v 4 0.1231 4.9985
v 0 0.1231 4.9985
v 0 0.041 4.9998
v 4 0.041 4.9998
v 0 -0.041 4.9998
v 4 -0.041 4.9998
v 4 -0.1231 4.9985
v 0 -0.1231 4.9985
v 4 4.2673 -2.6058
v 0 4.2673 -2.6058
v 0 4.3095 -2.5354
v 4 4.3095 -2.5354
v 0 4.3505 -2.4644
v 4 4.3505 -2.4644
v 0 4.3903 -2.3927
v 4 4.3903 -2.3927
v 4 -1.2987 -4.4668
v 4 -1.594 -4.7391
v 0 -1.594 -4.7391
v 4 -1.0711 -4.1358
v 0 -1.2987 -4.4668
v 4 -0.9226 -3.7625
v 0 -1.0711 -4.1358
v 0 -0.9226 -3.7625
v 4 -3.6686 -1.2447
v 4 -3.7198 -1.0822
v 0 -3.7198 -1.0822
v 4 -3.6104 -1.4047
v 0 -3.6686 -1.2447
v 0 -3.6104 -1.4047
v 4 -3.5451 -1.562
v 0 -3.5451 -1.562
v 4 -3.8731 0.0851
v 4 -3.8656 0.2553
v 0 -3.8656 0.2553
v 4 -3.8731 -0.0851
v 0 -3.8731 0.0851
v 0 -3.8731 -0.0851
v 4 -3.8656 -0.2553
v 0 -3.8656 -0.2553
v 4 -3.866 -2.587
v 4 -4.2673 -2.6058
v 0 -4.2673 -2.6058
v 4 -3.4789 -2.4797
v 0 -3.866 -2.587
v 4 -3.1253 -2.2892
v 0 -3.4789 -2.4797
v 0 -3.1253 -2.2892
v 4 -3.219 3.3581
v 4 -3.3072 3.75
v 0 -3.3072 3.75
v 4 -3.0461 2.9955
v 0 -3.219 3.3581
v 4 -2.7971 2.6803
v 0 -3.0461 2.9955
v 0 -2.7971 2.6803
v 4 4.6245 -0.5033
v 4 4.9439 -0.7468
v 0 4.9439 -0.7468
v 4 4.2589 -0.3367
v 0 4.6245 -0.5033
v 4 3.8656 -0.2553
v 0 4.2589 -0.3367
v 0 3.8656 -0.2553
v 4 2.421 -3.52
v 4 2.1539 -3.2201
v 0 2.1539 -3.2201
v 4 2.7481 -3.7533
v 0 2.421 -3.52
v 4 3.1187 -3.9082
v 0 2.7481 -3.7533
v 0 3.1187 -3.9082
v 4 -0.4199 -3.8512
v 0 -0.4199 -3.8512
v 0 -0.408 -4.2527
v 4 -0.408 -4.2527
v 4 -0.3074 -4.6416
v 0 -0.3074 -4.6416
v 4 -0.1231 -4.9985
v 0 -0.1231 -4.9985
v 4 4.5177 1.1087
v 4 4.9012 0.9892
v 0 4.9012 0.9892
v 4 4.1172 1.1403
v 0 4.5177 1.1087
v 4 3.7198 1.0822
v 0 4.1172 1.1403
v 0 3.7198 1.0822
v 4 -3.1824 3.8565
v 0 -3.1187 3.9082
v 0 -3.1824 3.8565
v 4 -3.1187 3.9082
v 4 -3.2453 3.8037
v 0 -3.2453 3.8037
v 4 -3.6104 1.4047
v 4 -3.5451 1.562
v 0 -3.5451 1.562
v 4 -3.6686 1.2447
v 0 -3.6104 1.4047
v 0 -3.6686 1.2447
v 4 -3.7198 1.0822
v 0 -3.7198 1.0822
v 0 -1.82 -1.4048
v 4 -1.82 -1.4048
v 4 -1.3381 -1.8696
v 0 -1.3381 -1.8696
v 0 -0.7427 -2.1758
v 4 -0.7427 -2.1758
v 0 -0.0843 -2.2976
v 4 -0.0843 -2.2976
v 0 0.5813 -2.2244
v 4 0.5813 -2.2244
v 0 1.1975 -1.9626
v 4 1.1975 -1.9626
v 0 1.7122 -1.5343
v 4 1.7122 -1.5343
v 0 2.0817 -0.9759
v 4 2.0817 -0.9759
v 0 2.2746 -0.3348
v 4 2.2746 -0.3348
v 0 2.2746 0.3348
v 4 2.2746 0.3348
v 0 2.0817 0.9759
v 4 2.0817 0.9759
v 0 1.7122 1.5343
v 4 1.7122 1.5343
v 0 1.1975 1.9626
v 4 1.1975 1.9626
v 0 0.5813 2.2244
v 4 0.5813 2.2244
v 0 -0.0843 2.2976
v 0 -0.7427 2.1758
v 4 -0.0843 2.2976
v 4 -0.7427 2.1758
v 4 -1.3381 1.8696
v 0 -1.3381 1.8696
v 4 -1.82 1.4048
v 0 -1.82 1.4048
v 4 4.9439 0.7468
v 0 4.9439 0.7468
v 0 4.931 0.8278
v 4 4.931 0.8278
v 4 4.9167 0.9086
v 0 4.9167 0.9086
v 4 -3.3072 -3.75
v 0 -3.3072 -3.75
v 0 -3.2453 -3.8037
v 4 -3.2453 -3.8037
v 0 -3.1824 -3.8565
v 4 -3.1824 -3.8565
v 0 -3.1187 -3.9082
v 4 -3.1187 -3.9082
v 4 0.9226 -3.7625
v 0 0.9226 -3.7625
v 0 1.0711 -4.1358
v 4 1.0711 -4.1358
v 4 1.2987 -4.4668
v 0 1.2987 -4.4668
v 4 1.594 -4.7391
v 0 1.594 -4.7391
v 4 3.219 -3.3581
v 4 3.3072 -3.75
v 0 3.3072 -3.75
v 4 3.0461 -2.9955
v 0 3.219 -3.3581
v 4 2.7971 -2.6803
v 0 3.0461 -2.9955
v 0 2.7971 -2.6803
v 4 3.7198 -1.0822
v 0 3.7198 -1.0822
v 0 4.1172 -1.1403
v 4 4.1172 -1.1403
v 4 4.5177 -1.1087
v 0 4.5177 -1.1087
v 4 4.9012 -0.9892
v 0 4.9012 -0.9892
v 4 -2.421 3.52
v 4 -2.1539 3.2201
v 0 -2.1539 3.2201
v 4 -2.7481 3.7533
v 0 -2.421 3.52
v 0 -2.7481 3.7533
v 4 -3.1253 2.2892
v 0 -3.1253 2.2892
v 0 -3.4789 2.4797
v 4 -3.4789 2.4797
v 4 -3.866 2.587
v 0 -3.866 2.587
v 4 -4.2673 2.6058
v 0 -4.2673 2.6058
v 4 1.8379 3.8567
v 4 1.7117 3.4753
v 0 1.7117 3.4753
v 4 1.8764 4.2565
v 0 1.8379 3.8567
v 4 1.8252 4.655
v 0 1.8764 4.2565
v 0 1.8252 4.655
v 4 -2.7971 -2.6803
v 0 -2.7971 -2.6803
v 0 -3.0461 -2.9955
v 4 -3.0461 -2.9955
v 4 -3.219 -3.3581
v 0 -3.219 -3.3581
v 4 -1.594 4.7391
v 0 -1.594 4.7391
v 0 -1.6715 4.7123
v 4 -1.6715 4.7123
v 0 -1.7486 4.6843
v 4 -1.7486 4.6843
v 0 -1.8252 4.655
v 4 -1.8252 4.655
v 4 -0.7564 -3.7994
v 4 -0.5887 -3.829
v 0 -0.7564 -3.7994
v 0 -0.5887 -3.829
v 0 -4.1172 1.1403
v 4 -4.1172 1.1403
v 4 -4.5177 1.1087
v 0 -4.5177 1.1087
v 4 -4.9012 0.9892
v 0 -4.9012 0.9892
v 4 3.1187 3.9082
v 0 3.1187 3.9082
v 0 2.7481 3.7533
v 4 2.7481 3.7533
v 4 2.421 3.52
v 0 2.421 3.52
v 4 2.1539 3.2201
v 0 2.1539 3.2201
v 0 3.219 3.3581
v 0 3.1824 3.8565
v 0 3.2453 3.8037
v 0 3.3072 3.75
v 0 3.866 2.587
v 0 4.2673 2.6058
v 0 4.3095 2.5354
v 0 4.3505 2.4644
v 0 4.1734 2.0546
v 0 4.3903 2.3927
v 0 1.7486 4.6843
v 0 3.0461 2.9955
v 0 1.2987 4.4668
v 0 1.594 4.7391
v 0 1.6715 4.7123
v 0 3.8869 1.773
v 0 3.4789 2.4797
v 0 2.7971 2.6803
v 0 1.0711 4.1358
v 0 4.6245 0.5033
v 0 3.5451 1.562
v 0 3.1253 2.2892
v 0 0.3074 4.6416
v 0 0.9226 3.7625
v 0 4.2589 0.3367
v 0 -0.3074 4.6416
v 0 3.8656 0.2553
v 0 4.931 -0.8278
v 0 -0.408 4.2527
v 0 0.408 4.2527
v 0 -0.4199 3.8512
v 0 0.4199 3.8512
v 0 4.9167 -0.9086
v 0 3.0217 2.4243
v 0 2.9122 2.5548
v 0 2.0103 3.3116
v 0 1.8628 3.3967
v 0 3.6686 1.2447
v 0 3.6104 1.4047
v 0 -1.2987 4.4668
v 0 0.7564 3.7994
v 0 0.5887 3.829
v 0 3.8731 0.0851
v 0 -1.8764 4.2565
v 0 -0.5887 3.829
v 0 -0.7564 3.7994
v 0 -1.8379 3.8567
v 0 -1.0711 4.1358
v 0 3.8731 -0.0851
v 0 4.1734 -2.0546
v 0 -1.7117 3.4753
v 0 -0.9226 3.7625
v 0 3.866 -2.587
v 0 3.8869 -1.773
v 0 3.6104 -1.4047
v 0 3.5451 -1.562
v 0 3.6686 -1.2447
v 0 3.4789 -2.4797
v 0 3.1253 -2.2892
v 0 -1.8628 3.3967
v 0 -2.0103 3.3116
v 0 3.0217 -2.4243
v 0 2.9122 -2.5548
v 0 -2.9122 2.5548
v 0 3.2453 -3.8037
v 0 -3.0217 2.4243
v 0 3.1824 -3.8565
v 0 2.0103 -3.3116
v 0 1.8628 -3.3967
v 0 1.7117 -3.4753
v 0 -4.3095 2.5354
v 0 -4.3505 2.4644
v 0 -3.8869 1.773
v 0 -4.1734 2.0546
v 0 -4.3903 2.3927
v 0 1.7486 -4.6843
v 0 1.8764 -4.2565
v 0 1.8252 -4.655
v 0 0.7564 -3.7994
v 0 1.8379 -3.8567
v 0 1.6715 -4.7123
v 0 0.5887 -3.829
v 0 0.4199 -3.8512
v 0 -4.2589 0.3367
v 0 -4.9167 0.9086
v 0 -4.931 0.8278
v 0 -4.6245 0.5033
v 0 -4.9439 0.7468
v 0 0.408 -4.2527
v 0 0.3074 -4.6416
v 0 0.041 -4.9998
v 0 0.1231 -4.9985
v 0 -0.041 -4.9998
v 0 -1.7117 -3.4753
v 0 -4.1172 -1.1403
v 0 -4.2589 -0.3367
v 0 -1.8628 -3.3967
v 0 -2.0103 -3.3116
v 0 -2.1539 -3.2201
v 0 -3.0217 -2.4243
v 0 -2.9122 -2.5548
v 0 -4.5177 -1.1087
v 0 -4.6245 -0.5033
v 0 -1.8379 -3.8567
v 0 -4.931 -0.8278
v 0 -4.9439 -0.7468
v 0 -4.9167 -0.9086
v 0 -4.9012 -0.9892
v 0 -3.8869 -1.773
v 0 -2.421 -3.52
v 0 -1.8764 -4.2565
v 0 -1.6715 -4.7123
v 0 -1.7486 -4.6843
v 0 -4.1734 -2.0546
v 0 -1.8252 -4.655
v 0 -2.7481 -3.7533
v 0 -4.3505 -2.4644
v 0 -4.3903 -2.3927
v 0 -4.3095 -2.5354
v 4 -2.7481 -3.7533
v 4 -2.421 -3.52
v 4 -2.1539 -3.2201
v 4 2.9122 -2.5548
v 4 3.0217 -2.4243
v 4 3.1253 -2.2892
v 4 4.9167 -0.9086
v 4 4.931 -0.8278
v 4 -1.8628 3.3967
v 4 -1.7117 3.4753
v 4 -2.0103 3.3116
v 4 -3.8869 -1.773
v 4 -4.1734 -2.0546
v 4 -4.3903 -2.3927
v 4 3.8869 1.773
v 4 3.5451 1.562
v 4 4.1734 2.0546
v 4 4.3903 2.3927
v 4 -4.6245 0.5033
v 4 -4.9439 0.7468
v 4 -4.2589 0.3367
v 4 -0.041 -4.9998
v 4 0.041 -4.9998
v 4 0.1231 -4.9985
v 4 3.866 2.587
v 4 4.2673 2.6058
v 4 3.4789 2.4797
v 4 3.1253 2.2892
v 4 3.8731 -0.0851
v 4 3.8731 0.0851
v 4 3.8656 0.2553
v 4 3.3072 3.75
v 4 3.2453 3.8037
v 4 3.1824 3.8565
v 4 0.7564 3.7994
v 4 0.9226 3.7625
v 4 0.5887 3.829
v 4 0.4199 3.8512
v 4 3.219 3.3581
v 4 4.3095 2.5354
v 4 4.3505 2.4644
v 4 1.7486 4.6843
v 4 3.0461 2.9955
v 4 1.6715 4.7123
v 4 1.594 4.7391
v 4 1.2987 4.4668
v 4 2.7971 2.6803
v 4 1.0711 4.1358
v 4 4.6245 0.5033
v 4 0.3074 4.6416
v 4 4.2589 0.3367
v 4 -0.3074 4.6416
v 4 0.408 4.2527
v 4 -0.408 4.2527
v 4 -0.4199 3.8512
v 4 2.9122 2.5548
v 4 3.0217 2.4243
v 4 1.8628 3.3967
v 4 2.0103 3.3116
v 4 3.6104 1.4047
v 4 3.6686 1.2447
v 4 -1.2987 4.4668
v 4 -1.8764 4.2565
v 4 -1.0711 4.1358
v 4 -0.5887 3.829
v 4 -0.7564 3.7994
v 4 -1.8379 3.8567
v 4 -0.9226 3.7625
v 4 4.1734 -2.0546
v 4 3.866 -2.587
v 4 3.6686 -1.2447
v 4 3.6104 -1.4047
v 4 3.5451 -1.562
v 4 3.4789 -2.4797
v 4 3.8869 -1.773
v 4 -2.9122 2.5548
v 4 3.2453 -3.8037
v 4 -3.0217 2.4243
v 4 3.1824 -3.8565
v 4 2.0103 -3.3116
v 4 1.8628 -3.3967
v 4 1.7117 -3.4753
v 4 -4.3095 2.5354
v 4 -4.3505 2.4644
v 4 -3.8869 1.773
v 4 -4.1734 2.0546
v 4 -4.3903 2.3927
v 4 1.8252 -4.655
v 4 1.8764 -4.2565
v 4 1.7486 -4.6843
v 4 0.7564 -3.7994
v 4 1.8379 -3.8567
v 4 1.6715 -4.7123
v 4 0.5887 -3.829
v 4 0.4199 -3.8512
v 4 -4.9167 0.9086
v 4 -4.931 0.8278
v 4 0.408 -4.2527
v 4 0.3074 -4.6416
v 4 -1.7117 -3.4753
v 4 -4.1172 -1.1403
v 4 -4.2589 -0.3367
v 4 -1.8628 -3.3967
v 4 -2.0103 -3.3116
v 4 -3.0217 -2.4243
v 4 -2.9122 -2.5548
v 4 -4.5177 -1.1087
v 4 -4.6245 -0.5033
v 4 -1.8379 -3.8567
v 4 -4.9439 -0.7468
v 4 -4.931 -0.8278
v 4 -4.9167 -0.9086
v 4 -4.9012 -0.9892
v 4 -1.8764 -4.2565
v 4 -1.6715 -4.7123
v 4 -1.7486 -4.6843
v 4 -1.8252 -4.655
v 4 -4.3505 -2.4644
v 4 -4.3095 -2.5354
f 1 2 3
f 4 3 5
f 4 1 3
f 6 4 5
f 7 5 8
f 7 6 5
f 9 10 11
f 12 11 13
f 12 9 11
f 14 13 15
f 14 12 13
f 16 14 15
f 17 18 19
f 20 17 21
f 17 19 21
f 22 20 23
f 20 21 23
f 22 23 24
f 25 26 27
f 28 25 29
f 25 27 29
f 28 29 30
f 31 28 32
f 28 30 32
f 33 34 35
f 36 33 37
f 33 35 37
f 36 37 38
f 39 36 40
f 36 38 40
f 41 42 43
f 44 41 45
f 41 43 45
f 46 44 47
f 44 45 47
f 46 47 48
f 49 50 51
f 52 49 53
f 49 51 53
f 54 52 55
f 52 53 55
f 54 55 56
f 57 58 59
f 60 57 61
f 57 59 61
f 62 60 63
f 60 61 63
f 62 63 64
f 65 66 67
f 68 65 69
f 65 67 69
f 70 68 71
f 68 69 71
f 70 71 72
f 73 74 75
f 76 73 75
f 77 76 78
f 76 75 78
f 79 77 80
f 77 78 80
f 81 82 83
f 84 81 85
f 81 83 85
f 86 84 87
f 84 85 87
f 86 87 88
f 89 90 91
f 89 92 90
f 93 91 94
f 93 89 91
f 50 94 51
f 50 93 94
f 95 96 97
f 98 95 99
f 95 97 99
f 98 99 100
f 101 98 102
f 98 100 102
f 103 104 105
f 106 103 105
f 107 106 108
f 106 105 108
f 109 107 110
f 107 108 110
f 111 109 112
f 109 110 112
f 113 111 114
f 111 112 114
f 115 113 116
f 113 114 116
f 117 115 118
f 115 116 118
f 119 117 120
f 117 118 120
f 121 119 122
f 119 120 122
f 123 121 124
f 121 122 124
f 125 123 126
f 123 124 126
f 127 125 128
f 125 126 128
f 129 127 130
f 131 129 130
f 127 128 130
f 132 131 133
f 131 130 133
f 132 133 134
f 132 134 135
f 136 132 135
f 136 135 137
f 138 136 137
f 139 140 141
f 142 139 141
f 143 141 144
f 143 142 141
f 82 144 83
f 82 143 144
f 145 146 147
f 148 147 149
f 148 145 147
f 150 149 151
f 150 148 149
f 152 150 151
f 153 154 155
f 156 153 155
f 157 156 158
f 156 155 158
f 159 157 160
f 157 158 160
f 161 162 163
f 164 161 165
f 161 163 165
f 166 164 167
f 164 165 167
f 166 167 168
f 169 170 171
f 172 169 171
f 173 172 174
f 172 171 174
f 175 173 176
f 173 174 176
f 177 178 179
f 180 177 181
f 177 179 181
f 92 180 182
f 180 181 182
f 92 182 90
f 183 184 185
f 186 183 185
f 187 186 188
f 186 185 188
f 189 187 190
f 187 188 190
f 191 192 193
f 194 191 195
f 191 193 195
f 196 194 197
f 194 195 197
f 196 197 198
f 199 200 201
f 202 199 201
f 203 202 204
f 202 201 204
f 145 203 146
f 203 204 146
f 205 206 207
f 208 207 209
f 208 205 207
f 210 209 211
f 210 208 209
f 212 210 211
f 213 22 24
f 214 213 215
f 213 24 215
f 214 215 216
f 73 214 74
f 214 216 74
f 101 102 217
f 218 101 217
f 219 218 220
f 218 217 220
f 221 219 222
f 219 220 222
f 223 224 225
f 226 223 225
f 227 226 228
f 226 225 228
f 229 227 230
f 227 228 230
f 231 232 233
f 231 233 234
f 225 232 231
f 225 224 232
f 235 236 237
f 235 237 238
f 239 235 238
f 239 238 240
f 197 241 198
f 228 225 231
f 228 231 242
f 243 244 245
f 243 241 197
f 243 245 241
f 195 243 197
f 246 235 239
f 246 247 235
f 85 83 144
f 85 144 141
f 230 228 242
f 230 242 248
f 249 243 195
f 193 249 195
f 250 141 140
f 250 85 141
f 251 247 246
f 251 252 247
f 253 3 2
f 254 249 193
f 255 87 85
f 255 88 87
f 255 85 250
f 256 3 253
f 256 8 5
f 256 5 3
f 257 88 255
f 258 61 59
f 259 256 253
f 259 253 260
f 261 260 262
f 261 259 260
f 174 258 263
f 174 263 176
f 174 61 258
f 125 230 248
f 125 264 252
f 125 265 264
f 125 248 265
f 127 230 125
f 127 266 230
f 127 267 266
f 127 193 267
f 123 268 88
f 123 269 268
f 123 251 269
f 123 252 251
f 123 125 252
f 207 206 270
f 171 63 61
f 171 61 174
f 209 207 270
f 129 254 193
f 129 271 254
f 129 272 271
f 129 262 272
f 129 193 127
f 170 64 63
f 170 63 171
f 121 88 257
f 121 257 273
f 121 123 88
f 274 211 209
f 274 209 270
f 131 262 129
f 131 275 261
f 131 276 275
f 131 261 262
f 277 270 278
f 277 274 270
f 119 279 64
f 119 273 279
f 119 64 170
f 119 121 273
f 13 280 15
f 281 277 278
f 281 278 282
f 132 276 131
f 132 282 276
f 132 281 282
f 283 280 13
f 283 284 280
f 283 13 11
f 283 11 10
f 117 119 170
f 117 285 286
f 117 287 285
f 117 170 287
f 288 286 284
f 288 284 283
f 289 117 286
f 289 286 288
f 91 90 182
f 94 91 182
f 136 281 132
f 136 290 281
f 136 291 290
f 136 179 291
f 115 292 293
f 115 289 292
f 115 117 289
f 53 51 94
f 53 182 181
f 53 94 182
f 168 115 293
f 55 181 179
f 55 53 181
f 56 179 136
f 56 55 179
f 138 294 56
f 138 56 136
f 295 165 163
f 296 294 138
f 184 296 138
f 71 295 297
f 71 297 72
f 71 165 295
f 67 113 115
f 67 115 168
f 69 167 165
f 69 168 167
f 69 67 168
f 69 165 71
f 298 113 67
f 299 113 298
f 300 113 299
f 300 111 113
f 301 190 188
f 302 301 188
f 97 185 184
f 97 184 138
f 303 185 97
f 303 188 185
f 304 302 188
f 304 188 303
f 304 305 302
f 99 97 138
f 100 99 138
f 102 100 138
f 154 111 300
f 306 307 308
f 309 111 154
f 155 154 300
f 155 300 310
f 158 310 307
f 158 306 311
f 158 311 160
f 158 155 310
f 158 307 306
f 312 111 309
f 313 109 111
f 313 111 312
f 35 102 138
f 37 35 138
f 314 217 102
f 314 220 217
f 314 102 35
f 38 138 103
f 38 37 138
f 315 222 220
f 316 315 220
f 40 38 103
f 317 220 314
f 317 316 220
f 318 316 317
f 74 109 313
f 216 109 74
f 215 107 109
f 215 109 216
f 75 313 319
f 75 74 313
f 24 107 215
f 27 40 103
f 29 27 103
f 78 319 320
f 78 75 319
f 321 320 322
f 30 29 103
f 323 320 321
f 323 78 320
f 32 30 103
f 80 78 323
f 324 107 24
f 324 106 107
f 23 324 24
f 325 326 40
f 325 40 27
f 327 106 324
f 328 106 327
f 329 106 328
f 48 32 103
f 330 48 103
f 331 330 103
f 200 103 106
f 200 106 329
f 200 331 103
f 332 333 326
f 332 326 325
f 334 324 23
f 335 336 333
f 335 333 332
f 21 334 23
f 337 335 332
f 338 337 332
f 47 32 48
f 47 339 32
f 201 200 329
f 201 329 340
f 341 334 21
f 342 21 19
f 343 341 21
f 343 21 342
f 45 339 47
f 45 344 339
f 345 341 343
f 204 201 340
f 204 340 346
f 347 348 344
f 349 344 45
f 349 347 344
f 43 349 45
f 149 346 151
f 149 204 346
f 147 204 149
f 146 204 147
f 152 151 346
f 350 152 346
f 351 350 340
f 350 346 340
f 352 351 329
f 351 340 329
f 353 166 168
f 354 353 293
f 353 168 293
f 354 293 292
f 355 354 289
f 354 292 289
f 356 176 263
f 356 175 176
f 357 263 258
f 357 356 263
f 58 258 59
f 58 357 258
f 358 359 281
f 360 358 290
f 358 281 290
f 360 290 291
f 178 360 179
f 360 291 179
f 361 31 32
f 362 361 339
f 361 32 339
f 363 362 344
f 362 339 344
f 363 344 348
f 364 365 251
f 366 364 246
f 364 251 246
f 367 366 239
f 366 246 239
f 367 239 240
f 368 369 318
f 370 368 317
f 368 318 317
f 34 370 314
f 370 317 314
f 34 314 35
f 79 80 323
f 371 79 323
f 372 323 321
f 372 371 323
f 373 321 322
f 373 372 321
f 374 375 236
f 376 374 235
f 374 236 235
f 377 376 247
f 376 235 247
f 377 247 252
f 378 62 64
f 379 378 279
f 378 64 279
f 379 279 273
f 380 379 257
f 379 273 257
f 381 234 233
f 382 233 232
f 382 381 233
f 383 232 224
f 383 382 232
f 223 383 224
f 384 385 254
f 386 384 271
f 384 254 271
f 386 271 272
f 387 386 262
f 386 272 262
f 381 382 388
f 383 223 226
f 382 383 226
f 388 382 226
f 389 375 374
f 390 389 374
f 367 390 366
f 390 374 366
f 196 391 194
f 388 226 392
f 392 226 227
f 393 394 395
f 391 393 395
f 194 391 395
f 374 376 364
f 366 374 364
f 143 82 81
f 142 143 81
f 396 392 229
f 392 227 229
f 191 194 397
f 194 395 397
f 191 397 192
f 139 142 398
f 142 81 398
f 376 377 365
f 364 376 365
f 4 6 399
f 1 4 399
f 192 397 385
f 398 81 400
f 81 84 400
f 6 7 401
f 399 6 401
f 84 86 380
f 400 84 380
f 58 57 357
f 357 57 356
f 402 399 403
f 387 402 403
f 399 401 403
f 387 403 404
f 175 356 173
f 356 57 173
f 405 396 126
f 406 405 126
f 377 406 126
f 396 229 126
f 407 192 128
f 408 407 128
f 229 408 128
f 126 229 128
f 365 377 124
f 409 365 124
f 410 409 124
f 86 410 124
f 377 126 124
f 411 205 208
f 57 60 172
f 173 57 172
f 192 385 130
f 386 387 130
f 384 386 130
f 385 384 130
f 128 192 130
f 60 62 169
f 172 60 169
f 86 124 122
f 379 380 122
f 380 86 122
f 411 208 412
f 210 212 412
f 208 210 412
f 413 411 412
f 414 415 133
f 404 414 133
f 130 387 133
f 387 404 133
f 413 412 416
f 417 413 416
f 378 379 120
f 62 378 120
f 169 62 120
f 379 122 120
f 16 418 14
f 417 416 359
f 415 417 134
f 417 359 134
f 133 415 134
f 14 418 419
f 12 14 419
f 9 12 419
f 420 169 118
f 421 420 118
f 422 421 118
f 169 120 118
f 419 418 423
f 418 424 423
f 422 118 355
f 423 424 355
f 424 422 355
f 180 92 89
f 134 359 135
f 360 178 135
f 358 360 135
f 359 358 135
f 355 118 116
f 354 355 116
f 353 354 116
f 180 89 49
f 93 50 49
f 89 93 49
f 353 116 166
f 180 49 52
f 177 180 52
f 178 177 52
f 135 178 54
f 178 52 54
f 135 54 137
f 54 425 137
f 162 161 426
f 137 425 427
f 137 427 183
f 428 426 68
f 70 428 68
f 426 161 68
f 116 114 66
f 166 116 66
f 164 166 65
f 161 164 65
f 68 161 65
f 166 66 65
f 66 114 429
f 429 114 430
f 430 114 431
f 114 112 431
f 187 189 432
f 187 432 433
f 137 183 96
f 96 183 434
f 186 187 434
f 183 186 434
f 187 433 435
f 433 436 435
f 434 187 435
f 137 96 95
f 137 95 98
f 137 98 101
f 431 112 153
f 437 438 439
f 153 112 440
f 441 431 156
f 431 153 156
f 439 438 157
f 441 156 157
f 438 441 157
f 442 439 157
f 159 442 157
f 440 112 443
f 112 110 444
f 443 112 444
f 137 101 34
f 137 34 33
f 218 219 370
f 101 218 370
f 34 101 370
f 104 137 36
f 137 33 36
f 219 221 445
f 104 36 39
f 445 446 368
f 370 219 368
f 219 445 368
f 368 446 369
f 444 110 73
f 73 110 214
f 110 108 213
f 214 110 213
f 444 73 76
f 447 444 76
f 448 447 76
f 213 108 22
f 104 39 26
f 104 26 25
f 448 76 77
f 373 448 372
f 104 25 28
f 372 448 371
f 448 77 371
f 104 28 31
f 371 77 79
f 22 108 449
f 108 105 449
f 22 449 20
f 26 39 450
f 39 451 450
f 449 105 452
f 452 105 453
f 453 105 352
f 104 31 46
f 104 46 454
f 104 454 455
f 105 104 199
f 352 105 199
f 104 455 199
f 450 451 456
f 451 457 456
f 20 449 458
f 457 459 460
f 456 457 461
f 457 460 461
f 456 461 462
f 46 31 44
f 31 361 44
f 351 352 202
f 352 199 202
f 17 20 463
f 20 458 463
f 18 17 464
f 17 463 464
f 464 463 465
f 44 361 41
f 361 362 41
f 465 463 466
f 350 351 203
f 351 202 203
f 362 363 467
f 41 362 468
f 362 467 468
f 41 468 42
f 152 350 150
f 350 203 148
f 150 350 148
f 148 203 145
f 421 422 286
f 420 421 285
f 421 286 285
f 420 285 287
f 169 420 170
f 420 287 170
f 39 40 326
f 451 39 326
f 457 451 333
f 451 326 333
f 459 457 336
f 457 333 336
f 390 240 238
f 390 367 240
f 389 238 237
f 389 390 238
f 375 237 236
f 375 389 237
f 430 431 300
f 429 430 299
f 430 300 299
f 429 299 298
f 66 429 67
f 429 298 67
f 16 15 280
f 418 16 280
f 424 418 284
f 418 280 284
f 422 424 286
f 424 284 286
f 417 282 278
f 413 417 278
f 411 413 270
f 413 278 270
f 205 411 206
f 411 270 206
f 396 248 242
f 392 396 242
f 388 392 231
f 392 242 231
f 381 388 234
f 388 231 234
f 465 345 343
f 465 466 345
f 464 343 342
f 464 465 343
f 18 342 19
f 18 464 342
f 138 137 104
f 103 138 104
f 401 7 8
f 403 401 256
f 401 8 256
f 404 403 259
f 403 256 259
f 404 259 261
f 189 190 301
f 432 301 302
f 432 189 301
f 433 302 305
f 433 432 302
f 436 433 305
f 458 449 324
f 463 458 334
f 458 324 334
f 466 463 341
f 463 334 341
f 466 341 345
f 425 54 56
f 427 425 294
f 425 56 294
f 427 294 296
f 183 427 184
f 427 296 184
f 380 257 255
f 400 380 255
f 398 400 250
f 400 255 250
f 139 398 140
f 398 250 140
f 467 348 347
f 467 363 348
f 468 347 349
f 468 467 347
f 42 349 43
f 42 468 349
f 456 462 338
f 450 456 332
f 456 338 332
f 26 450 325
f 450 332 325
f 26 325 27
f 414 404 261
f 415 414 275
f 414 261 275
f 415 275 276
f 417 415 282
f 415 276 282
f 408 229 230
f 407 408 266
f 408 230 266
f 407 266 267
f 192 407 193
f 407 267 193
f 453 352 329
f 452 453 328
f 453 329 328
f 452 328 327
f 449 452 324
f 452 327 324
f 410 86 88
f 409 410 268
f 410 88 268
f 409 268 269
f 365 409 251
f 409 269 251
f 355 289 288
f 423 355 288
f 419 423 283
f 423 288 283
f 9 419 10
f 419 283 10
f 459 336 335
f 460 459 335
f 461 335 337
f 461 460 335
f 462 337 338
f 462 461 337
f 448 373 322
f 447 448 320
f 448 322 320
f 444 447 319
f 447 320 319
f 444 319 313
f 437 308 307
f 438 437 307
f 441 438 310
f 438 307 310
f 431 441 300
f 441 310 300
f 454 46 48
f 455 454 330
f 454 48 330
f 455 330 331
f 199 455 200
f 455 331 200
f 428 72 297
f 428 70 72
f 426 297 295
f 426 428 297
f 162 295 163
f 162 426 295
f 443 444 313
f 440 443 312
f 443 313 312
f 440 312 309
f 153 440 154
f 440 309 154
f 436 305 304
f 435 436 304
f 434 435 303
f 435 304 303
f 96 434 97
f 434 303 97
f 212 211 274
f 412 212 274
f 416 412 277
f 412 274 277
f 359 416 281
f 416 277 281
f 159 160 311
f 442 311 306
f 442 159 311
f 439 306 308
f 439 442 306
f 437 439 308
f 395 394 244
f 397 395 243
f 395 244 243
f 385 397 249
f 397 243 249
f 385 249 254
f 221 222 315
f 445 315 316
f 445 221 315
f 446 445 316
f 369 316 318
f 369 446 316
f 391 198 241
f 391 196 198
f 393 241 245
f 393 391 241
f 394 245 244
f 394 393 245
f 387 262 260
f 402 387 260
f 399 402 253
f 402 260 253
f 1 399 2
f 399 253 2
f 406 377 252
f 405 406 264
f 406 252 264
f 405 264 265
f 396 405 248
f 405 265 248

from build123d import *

# Parameters (mm, degrees)
BASPROSKE_W     = 4
BASPROSKE_H     = 5
TOOTHCUT_DEPTH  = 9.124038405
TEETHCUTS_COUNT = 18
TEETHCUTS_ANGLE = 340
BORE_DEPTH      = 50.0000508


with BuildPart() as part:
    # BasProSke → Base-Revolve (revolve)
    with BuildSketch(Plane(origin=(0, 0, 0), x_dir=(1, 0, 0), z_dir=(0, 1, 0)), mode=Mode.PRIVATE) as base_revolve_sk:
        with Locations((2, 2.5)):
            Rectangle(BASPROSKE_W, BASPROSKE_H)
    revolve(base_revolve_sk.sketch.rotate(Axis((-10, 0, 0), (1, 0, 0)), 180), axis=Axis((-10, 0, 0), (1, 0, 0)))

    # TooCutSke → ToothCut (cut, through all)
    with BuildSketch(Plane(origin=(0, 0, 0), x_dir=(0, 0, -1), z_dir=(1, 0, 0))):
        with BuildLine():
            ThreePointArc((0.25527463, 3.865580275), (0, 3.874), (-0.25527463, 3.865580275))
            ThreePointArc((-0.25527463, 3.865580275), (-0.416281865, 4.46052923), (-0.768562654, 4.96628197))
            ThreePointArc((-0.768562654, 4.96628197), (0, 5.0254), (0.768562654, 4.96628197))
            ThreePointArc((0.768562654, 4.96628197), (0.416281865, 4.46052923), (0.25527463, 3.865580275))
        make_face()
    toothcut = extrude(amount=TOOTHCUT_DEPTH, mode=Mode.SUBTRACT)

    # TeethCuts: ToothCut ×18 about axis
    teethcuts_axis = Axis((-10, 0, 0), (1, 0, 0))
    for i in range(1, TEETHCUTS_COUNT):
        add(toothcut.rotate(teethcuts_axis, i * TEETHCUTS_ANGLE / (TEETHCUTS_COUNT - 1)), mode=Mode.SUBTRACT)

    # BorSke → Bore (cut, symmetric)
    with BuildSketch(Plane(origin=(0, 0, 0), x_dir=(0, 0, -1), z_dir=(1, 0, 0))):
        with BuildLine():
            Line((-1.40479833, -1.82), (1.40479833, -1.82))
            ThreePointArc((1.40479833, -1.82), (0, 2.299099464), (-1.40479833, -1.82))
        make_face()
    extrude(amount=BORE_DEPTH, both=True, mode=Mode.SUBTRACT)


solid = part.part
